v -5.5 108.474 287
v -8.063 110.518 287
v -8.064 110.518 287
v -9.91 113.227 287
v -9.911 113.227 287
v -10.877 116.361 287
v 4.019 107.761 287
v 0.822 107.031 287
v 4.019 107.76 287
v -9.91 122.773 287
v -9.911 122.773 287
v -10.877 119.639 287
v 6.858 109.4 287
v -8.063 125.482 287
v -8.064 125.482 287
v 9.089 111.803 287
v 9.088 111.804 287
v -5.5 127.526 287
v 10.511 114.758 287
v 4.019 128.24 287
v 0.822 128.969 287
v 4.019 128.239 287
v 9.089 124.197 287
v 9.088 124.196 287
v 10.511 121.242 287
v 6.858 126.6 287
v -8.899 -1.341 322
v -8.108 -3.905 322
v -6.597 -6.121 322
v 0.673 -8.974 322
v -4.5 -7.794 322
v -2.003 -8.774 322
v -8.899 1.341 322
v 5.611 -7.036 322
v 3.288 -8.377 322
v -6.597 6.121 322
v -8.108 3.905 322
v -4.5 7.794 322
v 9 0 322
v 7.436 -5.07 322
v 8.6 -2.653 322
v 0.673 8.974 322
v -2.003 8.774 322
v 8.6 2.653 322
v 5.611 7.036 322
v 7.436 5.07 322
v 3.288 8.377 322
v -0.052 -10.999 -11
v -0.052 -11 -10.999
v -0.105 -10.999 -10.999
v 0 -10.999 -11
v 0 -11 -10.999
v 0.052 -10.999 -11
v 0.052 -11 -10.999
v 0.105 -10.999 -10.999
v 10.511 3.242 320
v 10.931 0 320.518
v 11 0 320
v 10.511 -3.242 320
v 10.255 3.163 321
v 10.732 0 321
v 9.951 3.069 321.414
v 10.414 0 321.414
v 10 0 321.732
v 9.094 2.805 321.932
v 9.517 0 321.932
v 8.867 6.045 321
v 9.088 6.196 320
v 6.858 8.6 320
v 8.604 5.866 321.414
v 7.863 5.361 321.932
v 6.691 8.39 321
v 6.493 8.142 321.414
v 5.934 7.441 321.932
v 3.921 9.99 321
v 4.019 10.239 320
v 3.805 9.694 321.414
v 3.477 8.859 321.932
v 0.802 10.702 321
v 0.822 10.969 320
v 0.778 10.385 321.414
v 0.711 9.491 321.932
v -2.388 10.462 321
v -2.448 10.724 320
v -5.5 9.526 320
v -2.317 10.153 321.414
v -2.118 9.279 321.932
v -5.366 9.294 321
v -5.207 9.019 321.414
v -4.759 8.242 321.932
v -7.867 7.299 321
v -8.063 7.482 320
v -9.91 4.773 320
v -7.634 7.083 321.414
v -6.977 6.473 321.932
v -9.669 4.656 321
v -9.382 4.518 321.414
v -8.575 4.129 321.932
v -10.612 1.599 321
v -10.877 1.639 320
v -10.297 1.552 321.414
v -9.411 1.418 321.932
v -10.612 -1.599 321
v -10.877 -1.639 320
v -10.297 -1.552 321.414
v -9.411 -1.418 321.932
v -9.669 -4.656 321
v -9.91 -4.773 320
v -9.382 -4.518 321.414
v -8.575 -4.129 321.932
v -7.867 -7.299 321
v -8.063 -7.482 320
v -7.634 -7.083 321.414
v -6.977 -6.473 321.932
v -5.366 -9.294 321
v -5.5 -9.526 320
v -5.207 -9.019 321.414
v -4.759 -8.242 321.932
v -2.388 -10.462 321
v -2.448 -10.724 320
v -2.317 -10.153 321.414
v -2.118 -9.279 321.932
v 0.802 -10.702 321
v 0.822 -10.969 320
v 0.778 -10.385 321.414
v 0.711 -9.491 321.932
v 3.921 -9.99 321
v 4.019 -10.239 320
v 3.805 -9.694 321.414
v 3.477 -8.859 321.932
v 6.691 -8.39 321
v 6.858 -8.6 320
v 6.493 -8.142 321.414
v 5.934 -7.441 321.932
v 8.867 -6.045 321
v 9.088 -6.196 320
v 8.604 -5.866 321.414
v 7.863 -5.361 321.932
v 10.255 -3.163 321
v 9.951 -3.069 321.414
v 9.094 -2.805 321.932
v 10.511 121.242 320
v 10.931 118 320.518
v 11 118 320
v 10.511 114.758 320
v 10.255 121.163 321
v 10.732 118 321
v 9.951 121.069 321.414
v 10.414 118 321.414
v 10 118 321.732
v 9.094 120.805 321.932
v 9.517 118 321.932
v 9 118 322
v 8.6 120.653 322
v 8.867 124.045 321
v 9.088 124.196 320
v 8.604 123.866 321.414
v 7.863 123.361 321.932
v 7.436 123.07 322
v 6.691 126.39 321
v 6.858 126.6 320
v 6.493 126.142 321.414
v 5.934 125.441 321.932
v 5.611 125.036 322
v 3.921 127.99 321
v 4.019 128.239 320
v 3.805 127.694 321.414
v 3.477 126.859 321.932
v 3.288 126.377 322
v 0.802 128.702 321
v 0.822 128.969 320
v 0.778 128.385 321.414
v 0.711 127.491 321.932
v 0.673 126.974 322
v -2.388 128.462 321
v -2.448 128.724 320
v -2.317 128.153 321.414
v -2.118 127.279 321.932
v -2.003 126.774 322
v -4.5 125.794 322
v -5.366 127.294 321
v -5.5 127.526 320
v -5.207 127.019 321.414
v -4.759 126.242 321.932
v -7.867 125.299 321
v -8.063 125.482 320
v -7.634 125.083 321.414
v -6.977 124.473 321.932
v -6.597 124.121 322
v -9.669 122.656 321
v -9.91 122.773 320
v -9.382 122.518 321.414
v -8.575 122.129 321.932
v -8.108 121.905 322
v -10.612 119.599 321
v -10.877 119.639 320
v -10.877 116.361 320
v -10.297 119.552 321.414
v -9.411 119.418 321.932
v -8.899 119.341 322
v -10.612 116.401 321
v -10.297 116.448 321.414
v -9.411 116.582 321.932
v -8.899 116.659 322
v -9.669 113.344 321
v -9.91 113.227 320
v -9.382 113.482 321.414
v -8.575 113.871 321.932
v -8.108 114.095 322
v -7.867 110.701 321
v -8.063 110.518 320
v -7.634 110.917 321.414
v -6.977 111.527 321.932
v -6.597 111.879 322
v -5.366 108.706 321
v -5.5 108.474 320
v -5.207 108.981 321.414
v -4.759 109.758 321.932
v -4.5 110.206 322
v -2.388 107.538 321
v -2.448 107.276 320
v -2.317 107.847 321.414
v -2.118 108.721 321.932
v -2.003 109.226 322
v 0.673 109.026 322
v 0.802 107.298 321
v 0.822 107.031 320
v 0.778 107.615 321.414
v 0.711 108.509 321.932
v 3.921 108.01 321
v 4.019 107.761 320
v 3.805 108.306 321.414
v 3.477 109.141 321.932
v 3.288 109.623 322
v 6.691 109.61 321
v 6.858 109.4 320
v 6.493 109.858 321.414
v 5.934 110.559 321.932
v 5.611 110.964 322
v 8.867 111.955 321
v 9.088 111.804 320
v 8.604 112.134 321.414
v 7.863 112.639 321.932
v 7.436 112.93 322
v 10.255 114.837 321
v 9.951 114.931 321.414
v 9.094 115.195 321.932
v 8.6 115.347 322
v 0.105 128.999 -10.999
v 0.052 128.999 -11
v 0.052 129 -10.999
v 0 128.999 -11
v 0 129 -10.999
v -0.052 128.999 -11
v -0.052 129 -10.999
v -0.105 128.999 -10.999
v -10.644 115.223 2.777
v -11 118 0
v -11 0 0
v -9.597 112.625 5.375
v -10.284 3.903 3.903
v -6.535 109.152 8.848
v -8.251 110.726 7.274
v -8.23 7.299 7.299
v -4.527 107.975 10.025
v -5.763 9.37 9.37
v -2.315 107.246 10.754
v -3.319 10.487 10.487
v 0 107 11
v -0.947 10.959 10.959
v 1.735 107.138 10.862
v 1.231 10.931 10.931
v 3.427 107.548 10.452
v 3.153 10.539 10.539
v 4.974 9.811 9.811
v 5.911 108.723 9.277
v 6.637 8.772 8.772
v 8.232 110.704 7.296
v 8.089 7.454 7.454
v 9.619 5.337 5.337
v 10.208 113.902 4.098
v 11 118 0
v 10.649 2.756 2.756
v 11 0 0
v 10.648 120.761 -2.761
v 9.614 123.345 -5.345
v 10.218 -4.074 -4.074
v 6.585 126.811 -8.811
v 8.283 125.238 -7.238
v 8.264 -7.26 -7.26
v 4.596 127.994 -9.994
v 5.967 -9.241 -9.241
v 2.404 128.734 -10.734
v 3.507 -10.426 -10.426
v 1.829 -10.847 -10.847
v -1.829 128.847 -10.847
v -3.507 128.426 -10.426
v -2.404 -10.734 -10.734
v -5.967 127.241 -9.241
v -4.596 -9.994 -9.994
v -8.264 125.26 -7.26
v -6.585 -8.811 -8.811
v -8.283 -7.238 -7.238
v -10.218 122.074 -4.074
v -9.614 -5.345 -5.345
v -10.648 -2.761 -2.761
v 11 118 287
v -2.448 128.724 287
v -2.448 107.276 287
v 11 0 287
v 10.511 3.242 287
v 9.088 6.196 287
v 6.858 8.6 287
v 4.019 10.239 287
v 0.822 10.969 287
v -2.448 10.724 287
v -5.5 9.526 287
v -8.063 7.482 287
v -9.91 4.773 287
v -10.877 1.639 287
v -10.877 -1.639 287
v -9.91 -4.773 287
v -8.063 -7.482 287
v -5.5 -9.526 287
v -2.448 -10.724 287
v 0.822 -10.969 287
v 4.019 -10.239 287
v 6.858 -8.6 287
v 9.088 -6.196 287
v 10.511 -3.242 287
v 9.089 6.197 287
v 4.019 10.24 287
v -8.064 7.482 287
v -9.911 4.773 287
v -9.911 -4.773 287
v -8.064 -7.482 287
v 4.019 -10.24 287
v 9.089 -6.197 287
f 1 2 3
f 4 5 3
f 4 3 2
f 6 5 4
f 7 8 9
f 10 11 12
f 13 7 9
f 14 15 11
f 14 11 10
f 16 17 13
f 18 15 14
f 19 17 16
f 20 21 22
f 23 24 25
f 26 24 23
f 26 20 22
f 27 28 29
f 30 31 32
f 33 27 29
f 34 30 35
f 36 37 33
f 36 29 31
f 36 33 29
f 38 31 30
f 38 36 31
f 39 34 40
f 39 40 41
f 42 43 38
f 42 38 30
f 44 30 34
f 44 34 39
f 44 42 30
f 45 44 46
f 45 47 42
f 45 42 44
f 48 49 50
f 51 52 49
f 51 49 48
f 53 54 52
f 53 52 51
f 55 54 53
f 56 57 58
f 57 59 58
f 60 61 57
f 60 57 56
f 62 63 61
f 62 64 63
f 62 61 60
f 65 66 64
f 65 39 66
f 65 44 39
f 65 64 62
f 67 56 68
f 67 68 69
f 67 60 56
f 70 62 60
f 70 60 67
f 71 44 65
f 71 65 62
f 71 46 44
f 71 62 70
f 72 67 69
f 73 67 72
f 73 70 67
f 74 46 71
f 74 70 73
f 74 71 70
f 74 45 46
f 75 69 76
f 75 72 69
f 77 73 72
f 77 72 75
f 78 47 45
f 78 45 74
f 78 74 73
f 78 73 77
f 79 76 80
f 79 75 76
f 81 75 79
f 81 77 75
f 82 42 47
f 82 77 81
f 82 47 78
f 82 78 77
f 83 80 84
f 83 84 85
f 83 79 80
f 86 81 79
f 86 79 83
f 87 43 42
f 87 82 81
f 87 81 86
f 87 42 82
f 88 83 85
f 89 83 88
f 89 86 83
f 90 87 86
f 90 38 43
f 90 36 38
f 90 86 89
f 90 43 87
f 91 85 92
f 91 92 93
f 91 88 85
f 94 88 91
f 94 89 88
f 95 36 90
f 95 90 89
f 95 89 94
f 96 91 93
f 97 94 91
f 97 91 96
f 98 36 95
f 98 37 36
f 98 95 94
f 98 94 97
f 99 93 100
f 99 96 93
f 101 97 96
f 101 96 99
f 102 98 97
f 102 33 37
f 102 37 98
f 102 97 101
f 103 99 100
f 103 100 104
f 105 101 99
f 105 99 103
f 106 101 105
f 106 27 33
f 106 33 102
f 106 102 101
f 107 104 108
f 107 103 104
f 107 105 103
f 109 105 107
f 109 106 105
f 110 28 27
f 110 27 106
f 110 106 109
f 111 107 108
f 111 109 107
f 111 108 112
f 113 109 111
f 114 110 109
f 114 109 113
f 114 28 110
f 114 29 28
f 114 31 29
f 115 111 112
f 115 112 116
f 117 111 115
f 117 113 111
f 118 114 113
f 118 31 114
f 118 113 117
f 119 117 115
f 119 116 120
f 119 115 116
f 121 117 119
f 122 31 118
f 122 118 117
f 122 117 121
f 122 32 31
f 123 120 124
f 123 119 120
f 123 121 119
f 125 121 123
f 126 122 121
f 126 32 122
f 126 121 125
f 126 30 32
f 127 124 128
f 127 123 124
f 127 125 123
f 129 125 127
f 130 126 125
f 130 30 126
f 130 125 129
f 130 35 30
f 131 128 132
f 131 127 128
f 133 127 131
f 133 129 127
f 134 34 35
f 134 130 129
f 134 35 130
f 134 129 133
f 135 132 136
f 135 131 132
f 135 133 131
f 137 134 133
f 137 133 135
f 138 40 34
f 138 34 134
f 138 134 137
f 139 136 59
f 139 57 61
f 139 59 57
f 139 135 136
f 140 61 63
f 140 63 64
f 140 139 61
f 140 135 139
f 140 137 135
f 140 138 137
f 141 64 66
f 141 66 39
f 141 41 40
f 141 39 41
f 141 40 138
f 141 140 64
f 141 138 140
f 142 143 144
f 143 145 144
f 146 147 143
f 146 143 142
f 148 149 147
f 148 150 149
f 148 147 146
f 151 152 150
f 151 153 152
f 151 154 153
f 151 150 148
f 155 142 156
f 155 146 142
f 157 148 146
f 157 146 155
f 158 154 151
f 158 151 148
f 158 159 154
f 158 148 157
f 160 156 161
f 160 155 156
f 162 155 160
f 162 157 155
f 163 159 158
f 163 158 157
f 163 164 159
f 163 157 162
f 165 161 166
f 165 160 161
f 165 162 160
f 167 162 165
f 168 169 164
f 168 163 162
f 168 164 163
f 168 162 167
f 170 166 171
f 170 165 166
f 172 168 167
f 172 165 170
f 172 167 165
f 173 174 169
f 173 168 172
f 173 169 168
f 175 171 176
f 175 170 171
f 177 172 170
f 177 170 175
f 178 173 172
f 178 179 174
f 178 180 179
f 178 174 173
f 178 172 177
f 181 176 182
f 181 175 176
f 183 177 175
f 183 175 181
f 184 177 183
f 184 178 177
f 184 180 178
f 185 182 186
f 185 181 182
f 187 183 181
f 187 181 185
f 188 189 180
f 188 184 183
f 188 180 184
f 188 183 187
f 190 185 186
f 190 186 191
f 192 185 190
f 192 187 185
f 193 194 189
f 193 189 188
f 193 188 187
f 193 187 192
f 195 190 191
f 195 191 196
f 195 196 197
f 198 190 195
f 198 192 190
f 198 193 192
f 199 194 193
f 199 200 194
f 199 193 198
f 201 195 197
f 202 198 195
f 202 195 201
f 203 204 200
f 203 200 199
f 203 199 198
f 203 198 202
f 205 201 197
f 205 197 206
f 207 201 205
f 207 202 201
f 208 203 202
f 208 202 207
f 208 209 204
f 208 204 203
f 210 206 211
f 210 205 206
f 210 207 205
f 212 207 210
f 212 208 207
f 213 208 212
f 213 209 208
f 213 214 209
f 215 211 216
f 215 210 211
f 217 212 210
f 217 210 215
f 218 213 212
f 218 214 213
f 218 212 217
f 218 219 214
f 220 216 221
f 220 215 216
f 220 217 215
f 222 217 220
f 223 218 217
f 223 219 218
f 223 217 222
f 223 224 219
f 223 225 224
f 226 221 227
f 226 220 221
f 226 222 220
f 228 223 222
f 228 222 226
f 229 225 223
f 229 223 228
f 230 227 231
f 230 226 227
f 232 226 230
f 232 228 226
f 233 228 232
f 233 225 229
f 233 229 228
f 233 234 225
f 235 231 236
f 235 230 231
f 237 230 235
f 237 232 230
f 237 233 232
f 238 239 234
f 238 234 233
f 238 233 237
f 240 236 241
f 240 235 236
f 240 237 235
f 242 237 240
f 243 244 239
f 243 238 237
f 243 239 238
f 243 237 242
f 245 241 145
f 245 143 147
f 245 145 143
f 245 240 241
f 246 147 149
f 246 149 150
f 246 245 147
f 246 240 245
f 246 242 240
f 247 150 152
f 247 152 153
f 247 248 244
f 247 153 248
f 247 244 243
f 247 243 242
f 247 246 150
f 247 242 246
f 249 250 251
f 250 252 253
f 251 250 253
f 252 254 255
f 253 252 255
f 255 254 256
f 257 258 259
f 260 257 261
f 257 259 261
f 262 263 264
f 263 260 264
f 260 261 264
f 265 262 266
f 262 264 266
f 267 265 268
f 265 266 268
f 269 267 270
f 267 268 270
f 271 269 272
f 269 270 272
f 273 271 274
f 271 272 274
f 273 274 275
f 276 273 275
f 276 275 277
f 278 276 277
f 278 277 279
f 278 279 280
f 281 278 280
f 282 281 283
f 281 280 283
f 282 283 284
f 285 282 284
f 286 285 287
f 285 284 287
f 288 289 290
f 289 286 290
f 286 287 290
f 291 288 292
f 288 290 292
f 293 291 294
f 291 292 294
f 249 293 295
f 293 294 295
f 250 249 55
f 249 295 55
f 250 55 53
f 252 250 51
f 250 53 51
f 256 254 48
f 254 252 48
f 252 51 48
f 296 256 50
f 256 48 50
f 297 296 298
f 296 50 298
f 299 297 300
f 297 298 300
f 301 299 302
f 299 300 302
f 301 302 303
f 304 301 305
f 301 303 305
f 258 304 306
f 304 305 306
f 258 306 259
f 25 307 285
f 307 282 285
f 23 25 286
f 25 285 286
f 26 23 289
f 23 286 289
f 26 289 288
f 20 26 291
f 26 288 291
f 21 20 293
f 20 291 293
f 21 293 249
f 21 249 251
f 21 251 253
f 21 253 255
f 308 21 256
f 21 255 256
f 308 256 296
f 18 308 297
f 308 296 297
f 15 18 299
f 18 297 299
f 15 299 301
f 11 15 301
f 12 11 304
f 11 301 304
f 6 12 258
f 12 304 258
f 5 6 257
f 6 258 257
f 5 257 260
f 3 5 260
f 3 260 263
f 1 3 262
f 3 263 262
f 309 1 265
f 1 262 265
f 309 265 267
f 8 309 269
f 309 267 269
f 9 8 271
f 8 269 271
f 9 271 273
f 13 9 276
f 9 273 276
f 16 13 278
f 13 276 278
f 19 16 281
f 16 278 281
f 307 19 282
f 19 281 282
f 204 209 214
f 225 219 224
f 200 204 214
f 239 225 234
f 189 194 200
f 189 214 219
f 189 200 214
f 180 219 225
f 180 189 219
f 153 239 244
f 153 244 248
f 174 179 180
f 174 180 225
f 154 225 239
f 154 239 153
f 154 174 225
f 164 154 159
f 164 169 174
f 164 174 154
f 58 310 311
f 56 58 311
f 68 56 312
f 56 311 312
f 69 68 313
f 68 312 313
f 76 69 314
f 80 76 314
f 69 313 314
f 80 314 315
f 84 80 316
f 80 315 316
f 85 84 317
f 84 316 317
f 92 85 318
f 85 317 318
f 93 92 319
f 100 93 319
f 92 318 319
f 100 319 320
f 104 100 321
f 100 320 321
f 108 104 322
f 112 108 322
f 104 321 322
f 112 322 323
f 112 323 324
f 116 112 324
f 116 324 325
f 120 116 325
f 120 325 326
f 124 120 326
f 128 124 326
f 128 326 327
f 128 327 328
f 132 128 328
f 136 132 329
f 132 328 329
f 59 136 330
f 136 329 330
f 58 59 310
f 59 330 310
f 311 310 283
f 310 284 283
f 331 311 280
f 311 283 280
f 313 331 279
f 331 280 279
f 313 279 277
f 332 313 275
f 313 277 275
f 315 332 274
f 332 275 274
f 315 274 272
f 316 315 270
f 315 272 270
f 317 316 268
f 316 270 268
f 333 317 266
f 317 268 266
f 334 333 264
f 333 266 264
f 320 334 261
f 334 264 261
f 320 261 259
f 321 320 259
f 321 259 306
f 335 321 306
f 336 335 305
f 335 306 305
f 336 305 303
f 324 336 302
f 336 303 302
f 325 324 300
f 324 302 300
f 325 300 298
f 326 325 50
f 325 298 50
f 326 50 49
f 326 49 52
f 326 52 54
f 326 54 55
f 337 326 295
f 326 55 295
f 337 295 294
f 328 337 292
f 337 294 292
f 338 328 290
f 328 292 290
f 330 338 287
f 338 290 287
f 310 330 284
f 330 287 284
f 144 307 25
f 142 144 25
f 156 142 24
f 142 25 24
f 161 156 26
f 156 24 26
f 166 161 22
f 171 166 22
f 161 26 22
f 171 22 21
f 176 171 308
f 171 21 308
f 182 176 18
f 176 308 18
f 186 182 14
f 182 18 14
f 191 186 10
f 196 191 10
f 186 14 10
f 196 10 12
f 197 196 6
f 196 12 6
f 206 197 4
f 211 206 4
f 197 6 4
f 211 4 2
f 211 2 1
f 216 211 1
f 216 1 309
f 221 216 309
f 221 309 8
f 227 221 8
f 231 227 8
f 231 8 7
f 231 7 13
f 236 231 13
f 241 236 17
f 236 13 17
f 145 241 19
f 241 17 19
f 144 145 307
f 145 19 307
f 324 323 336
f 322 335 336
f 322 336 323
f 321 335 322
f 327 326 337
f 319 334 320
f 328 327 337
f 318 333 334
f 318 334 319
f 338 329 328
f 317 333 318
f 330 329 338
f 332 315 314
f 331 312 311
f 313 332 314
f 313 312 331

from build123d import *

# Parameters (mm, degrees)
SKETCH_1_R             = 11
EXTRUDE_1_DEPTH        = 287
SKETCH_2_R             = 11
EXTRUDE_2_DEPTH        = 118
PATTERN_LINEAR_1_COUNT = 2
PATTERN_LINEAR_1_PITCH = 118
CHAMFER_3_SIZE         = 21.999
SKETCH_3_R             = 10.9995
EXTRUDE_3_DEPTH        = 35
FILLET_1_R             = 2


with BuildPart() as part:
    # 草图1 → 拉伸1 (new body)
    with BuildSketch(Plane.XY):
        Circle(SKETCH_1_R)
    extrude_1 = extrude(amount=EXTRUDE_1_DEPTH)

    # 草图2 → 拉伸2 (add)
    with BuildSketch(Plane(origin=(0, 0, 0), x_dir=(1, 0, 0), z_dir=(0, 1, 0))):
        with Locations(Location((0, 0, 0), (0, 0, 180))):
            Circle(SKETCH_2_R)
    extrude(amount=EXTRUDE_2_DEPTH)

    # 阵列(线性)1: 拉伸1 ×2
    with Locations(*[(0, i * PATTERN_LINEAR_1_PITCH, 0) for i in range(1, PATTERN_LINEAR_1_COUNT)]):
        add(extrude_1)

    # 倒角3
    # the kernel refuses this chamfer: 21.999 mm, written as the material it adds along each edge
    with BuildSketch(Plane(origin=(67.574454052, 0, 0), x_dir=(0, -0.9996219169112966, 0.027495876610586372), z_dir=(-1, 0, 0))) as chamfer_3_piece_1_section:
        Polygon((CHAMFER_3_SIZE * 0.999621916911, -CHAMFER_3_SIZE * 0.0274958766106), (-CHAMFER_3_SIZE * 0.0274958766106, -CHAMFER_3_SIZE * 0.999621916911), (0, 0), align=None)
    chamfer_3_piece_1 = extrude(amount=135.148908105, mode=Mode.PRIVATE)
    chamfer_3_piece_1 = chamfer_3_piece_1 & Plane(origin=(0, 0, -4.859651136), x_dir=(1, 0, 0), z_dir=(0, 0, -1)) * Cylinder(11, 359, mode=Mode.PRIVATE)
    chamfer_3_piece_1 = chamfer_3_piece_1 & Plane(origin=(0, -4.859651136, 0), x_dir=(-1, 0, 0), z_dir=(0, -1, 0)) * Cylinder(11, 359, mode=Mode.PRIVATE)
    add(chamfer_3_piece_1)
    with BuildSketch(Plane(origin=(-67.574454052, 118, 0), x_dir=(0, -0.027495876610586358, -0.9996219169112966), z_dir=(1, 0, 0))) as chamfer_3_piece_2_section:
        Polygon((CHAMFER_3_SIZE * 0.999621916911, CHAMFER_3_SIZE * 0.0274958766106), (-CHAMFER_3_SIZE * 0.0274958766106, CHAMFER_3_SIZE * 0.999621916911), (0, 0), align=None)
    chamfer_3_piece_2 = extrude(amount=135.148908105, mode=Mode.PRIVATE)
    chamfer_3_piece_2 = chamfer_3_piece_2 & Plane(origin=(0, 122.859651136, 0), x_dir=(-1, 0, 0), z_dir=(0, -1, 0)) * Cylinder(11, 359, mode=Mode.PRIVATE)
    chamfer_3_piece_2 = chamfer_3_piece_2 & Plane(origin=(0, 118, -4.859651136), x_dir=(1, 0, 0), z_dir=(0, 0, -1)) * Cylinder(11, 359, mode=Mode.PRIVATE)
    add(chamfer_3_piece_2)

    # 草图3 → 拉伸3 (add)
    with BuildSketch(Plane.XY.offset(287)):
        with Locations((0, 118)):
            Circle(SKETCH_3_R)
        Circle(SKETCH_3_R)
    extrude(amount=EXTRUDE_3_DEPTH)

    # 圆角1
    fillet_1_edges = [part.edges().sort_by_distance(p)[0] for p in [
        (-10.9995, 118, 322),
        (-10.9995, 0, 322),
    ]]
    fillet(fillet_1_edges, radius=FILLET_1_R)


solid = part.part
